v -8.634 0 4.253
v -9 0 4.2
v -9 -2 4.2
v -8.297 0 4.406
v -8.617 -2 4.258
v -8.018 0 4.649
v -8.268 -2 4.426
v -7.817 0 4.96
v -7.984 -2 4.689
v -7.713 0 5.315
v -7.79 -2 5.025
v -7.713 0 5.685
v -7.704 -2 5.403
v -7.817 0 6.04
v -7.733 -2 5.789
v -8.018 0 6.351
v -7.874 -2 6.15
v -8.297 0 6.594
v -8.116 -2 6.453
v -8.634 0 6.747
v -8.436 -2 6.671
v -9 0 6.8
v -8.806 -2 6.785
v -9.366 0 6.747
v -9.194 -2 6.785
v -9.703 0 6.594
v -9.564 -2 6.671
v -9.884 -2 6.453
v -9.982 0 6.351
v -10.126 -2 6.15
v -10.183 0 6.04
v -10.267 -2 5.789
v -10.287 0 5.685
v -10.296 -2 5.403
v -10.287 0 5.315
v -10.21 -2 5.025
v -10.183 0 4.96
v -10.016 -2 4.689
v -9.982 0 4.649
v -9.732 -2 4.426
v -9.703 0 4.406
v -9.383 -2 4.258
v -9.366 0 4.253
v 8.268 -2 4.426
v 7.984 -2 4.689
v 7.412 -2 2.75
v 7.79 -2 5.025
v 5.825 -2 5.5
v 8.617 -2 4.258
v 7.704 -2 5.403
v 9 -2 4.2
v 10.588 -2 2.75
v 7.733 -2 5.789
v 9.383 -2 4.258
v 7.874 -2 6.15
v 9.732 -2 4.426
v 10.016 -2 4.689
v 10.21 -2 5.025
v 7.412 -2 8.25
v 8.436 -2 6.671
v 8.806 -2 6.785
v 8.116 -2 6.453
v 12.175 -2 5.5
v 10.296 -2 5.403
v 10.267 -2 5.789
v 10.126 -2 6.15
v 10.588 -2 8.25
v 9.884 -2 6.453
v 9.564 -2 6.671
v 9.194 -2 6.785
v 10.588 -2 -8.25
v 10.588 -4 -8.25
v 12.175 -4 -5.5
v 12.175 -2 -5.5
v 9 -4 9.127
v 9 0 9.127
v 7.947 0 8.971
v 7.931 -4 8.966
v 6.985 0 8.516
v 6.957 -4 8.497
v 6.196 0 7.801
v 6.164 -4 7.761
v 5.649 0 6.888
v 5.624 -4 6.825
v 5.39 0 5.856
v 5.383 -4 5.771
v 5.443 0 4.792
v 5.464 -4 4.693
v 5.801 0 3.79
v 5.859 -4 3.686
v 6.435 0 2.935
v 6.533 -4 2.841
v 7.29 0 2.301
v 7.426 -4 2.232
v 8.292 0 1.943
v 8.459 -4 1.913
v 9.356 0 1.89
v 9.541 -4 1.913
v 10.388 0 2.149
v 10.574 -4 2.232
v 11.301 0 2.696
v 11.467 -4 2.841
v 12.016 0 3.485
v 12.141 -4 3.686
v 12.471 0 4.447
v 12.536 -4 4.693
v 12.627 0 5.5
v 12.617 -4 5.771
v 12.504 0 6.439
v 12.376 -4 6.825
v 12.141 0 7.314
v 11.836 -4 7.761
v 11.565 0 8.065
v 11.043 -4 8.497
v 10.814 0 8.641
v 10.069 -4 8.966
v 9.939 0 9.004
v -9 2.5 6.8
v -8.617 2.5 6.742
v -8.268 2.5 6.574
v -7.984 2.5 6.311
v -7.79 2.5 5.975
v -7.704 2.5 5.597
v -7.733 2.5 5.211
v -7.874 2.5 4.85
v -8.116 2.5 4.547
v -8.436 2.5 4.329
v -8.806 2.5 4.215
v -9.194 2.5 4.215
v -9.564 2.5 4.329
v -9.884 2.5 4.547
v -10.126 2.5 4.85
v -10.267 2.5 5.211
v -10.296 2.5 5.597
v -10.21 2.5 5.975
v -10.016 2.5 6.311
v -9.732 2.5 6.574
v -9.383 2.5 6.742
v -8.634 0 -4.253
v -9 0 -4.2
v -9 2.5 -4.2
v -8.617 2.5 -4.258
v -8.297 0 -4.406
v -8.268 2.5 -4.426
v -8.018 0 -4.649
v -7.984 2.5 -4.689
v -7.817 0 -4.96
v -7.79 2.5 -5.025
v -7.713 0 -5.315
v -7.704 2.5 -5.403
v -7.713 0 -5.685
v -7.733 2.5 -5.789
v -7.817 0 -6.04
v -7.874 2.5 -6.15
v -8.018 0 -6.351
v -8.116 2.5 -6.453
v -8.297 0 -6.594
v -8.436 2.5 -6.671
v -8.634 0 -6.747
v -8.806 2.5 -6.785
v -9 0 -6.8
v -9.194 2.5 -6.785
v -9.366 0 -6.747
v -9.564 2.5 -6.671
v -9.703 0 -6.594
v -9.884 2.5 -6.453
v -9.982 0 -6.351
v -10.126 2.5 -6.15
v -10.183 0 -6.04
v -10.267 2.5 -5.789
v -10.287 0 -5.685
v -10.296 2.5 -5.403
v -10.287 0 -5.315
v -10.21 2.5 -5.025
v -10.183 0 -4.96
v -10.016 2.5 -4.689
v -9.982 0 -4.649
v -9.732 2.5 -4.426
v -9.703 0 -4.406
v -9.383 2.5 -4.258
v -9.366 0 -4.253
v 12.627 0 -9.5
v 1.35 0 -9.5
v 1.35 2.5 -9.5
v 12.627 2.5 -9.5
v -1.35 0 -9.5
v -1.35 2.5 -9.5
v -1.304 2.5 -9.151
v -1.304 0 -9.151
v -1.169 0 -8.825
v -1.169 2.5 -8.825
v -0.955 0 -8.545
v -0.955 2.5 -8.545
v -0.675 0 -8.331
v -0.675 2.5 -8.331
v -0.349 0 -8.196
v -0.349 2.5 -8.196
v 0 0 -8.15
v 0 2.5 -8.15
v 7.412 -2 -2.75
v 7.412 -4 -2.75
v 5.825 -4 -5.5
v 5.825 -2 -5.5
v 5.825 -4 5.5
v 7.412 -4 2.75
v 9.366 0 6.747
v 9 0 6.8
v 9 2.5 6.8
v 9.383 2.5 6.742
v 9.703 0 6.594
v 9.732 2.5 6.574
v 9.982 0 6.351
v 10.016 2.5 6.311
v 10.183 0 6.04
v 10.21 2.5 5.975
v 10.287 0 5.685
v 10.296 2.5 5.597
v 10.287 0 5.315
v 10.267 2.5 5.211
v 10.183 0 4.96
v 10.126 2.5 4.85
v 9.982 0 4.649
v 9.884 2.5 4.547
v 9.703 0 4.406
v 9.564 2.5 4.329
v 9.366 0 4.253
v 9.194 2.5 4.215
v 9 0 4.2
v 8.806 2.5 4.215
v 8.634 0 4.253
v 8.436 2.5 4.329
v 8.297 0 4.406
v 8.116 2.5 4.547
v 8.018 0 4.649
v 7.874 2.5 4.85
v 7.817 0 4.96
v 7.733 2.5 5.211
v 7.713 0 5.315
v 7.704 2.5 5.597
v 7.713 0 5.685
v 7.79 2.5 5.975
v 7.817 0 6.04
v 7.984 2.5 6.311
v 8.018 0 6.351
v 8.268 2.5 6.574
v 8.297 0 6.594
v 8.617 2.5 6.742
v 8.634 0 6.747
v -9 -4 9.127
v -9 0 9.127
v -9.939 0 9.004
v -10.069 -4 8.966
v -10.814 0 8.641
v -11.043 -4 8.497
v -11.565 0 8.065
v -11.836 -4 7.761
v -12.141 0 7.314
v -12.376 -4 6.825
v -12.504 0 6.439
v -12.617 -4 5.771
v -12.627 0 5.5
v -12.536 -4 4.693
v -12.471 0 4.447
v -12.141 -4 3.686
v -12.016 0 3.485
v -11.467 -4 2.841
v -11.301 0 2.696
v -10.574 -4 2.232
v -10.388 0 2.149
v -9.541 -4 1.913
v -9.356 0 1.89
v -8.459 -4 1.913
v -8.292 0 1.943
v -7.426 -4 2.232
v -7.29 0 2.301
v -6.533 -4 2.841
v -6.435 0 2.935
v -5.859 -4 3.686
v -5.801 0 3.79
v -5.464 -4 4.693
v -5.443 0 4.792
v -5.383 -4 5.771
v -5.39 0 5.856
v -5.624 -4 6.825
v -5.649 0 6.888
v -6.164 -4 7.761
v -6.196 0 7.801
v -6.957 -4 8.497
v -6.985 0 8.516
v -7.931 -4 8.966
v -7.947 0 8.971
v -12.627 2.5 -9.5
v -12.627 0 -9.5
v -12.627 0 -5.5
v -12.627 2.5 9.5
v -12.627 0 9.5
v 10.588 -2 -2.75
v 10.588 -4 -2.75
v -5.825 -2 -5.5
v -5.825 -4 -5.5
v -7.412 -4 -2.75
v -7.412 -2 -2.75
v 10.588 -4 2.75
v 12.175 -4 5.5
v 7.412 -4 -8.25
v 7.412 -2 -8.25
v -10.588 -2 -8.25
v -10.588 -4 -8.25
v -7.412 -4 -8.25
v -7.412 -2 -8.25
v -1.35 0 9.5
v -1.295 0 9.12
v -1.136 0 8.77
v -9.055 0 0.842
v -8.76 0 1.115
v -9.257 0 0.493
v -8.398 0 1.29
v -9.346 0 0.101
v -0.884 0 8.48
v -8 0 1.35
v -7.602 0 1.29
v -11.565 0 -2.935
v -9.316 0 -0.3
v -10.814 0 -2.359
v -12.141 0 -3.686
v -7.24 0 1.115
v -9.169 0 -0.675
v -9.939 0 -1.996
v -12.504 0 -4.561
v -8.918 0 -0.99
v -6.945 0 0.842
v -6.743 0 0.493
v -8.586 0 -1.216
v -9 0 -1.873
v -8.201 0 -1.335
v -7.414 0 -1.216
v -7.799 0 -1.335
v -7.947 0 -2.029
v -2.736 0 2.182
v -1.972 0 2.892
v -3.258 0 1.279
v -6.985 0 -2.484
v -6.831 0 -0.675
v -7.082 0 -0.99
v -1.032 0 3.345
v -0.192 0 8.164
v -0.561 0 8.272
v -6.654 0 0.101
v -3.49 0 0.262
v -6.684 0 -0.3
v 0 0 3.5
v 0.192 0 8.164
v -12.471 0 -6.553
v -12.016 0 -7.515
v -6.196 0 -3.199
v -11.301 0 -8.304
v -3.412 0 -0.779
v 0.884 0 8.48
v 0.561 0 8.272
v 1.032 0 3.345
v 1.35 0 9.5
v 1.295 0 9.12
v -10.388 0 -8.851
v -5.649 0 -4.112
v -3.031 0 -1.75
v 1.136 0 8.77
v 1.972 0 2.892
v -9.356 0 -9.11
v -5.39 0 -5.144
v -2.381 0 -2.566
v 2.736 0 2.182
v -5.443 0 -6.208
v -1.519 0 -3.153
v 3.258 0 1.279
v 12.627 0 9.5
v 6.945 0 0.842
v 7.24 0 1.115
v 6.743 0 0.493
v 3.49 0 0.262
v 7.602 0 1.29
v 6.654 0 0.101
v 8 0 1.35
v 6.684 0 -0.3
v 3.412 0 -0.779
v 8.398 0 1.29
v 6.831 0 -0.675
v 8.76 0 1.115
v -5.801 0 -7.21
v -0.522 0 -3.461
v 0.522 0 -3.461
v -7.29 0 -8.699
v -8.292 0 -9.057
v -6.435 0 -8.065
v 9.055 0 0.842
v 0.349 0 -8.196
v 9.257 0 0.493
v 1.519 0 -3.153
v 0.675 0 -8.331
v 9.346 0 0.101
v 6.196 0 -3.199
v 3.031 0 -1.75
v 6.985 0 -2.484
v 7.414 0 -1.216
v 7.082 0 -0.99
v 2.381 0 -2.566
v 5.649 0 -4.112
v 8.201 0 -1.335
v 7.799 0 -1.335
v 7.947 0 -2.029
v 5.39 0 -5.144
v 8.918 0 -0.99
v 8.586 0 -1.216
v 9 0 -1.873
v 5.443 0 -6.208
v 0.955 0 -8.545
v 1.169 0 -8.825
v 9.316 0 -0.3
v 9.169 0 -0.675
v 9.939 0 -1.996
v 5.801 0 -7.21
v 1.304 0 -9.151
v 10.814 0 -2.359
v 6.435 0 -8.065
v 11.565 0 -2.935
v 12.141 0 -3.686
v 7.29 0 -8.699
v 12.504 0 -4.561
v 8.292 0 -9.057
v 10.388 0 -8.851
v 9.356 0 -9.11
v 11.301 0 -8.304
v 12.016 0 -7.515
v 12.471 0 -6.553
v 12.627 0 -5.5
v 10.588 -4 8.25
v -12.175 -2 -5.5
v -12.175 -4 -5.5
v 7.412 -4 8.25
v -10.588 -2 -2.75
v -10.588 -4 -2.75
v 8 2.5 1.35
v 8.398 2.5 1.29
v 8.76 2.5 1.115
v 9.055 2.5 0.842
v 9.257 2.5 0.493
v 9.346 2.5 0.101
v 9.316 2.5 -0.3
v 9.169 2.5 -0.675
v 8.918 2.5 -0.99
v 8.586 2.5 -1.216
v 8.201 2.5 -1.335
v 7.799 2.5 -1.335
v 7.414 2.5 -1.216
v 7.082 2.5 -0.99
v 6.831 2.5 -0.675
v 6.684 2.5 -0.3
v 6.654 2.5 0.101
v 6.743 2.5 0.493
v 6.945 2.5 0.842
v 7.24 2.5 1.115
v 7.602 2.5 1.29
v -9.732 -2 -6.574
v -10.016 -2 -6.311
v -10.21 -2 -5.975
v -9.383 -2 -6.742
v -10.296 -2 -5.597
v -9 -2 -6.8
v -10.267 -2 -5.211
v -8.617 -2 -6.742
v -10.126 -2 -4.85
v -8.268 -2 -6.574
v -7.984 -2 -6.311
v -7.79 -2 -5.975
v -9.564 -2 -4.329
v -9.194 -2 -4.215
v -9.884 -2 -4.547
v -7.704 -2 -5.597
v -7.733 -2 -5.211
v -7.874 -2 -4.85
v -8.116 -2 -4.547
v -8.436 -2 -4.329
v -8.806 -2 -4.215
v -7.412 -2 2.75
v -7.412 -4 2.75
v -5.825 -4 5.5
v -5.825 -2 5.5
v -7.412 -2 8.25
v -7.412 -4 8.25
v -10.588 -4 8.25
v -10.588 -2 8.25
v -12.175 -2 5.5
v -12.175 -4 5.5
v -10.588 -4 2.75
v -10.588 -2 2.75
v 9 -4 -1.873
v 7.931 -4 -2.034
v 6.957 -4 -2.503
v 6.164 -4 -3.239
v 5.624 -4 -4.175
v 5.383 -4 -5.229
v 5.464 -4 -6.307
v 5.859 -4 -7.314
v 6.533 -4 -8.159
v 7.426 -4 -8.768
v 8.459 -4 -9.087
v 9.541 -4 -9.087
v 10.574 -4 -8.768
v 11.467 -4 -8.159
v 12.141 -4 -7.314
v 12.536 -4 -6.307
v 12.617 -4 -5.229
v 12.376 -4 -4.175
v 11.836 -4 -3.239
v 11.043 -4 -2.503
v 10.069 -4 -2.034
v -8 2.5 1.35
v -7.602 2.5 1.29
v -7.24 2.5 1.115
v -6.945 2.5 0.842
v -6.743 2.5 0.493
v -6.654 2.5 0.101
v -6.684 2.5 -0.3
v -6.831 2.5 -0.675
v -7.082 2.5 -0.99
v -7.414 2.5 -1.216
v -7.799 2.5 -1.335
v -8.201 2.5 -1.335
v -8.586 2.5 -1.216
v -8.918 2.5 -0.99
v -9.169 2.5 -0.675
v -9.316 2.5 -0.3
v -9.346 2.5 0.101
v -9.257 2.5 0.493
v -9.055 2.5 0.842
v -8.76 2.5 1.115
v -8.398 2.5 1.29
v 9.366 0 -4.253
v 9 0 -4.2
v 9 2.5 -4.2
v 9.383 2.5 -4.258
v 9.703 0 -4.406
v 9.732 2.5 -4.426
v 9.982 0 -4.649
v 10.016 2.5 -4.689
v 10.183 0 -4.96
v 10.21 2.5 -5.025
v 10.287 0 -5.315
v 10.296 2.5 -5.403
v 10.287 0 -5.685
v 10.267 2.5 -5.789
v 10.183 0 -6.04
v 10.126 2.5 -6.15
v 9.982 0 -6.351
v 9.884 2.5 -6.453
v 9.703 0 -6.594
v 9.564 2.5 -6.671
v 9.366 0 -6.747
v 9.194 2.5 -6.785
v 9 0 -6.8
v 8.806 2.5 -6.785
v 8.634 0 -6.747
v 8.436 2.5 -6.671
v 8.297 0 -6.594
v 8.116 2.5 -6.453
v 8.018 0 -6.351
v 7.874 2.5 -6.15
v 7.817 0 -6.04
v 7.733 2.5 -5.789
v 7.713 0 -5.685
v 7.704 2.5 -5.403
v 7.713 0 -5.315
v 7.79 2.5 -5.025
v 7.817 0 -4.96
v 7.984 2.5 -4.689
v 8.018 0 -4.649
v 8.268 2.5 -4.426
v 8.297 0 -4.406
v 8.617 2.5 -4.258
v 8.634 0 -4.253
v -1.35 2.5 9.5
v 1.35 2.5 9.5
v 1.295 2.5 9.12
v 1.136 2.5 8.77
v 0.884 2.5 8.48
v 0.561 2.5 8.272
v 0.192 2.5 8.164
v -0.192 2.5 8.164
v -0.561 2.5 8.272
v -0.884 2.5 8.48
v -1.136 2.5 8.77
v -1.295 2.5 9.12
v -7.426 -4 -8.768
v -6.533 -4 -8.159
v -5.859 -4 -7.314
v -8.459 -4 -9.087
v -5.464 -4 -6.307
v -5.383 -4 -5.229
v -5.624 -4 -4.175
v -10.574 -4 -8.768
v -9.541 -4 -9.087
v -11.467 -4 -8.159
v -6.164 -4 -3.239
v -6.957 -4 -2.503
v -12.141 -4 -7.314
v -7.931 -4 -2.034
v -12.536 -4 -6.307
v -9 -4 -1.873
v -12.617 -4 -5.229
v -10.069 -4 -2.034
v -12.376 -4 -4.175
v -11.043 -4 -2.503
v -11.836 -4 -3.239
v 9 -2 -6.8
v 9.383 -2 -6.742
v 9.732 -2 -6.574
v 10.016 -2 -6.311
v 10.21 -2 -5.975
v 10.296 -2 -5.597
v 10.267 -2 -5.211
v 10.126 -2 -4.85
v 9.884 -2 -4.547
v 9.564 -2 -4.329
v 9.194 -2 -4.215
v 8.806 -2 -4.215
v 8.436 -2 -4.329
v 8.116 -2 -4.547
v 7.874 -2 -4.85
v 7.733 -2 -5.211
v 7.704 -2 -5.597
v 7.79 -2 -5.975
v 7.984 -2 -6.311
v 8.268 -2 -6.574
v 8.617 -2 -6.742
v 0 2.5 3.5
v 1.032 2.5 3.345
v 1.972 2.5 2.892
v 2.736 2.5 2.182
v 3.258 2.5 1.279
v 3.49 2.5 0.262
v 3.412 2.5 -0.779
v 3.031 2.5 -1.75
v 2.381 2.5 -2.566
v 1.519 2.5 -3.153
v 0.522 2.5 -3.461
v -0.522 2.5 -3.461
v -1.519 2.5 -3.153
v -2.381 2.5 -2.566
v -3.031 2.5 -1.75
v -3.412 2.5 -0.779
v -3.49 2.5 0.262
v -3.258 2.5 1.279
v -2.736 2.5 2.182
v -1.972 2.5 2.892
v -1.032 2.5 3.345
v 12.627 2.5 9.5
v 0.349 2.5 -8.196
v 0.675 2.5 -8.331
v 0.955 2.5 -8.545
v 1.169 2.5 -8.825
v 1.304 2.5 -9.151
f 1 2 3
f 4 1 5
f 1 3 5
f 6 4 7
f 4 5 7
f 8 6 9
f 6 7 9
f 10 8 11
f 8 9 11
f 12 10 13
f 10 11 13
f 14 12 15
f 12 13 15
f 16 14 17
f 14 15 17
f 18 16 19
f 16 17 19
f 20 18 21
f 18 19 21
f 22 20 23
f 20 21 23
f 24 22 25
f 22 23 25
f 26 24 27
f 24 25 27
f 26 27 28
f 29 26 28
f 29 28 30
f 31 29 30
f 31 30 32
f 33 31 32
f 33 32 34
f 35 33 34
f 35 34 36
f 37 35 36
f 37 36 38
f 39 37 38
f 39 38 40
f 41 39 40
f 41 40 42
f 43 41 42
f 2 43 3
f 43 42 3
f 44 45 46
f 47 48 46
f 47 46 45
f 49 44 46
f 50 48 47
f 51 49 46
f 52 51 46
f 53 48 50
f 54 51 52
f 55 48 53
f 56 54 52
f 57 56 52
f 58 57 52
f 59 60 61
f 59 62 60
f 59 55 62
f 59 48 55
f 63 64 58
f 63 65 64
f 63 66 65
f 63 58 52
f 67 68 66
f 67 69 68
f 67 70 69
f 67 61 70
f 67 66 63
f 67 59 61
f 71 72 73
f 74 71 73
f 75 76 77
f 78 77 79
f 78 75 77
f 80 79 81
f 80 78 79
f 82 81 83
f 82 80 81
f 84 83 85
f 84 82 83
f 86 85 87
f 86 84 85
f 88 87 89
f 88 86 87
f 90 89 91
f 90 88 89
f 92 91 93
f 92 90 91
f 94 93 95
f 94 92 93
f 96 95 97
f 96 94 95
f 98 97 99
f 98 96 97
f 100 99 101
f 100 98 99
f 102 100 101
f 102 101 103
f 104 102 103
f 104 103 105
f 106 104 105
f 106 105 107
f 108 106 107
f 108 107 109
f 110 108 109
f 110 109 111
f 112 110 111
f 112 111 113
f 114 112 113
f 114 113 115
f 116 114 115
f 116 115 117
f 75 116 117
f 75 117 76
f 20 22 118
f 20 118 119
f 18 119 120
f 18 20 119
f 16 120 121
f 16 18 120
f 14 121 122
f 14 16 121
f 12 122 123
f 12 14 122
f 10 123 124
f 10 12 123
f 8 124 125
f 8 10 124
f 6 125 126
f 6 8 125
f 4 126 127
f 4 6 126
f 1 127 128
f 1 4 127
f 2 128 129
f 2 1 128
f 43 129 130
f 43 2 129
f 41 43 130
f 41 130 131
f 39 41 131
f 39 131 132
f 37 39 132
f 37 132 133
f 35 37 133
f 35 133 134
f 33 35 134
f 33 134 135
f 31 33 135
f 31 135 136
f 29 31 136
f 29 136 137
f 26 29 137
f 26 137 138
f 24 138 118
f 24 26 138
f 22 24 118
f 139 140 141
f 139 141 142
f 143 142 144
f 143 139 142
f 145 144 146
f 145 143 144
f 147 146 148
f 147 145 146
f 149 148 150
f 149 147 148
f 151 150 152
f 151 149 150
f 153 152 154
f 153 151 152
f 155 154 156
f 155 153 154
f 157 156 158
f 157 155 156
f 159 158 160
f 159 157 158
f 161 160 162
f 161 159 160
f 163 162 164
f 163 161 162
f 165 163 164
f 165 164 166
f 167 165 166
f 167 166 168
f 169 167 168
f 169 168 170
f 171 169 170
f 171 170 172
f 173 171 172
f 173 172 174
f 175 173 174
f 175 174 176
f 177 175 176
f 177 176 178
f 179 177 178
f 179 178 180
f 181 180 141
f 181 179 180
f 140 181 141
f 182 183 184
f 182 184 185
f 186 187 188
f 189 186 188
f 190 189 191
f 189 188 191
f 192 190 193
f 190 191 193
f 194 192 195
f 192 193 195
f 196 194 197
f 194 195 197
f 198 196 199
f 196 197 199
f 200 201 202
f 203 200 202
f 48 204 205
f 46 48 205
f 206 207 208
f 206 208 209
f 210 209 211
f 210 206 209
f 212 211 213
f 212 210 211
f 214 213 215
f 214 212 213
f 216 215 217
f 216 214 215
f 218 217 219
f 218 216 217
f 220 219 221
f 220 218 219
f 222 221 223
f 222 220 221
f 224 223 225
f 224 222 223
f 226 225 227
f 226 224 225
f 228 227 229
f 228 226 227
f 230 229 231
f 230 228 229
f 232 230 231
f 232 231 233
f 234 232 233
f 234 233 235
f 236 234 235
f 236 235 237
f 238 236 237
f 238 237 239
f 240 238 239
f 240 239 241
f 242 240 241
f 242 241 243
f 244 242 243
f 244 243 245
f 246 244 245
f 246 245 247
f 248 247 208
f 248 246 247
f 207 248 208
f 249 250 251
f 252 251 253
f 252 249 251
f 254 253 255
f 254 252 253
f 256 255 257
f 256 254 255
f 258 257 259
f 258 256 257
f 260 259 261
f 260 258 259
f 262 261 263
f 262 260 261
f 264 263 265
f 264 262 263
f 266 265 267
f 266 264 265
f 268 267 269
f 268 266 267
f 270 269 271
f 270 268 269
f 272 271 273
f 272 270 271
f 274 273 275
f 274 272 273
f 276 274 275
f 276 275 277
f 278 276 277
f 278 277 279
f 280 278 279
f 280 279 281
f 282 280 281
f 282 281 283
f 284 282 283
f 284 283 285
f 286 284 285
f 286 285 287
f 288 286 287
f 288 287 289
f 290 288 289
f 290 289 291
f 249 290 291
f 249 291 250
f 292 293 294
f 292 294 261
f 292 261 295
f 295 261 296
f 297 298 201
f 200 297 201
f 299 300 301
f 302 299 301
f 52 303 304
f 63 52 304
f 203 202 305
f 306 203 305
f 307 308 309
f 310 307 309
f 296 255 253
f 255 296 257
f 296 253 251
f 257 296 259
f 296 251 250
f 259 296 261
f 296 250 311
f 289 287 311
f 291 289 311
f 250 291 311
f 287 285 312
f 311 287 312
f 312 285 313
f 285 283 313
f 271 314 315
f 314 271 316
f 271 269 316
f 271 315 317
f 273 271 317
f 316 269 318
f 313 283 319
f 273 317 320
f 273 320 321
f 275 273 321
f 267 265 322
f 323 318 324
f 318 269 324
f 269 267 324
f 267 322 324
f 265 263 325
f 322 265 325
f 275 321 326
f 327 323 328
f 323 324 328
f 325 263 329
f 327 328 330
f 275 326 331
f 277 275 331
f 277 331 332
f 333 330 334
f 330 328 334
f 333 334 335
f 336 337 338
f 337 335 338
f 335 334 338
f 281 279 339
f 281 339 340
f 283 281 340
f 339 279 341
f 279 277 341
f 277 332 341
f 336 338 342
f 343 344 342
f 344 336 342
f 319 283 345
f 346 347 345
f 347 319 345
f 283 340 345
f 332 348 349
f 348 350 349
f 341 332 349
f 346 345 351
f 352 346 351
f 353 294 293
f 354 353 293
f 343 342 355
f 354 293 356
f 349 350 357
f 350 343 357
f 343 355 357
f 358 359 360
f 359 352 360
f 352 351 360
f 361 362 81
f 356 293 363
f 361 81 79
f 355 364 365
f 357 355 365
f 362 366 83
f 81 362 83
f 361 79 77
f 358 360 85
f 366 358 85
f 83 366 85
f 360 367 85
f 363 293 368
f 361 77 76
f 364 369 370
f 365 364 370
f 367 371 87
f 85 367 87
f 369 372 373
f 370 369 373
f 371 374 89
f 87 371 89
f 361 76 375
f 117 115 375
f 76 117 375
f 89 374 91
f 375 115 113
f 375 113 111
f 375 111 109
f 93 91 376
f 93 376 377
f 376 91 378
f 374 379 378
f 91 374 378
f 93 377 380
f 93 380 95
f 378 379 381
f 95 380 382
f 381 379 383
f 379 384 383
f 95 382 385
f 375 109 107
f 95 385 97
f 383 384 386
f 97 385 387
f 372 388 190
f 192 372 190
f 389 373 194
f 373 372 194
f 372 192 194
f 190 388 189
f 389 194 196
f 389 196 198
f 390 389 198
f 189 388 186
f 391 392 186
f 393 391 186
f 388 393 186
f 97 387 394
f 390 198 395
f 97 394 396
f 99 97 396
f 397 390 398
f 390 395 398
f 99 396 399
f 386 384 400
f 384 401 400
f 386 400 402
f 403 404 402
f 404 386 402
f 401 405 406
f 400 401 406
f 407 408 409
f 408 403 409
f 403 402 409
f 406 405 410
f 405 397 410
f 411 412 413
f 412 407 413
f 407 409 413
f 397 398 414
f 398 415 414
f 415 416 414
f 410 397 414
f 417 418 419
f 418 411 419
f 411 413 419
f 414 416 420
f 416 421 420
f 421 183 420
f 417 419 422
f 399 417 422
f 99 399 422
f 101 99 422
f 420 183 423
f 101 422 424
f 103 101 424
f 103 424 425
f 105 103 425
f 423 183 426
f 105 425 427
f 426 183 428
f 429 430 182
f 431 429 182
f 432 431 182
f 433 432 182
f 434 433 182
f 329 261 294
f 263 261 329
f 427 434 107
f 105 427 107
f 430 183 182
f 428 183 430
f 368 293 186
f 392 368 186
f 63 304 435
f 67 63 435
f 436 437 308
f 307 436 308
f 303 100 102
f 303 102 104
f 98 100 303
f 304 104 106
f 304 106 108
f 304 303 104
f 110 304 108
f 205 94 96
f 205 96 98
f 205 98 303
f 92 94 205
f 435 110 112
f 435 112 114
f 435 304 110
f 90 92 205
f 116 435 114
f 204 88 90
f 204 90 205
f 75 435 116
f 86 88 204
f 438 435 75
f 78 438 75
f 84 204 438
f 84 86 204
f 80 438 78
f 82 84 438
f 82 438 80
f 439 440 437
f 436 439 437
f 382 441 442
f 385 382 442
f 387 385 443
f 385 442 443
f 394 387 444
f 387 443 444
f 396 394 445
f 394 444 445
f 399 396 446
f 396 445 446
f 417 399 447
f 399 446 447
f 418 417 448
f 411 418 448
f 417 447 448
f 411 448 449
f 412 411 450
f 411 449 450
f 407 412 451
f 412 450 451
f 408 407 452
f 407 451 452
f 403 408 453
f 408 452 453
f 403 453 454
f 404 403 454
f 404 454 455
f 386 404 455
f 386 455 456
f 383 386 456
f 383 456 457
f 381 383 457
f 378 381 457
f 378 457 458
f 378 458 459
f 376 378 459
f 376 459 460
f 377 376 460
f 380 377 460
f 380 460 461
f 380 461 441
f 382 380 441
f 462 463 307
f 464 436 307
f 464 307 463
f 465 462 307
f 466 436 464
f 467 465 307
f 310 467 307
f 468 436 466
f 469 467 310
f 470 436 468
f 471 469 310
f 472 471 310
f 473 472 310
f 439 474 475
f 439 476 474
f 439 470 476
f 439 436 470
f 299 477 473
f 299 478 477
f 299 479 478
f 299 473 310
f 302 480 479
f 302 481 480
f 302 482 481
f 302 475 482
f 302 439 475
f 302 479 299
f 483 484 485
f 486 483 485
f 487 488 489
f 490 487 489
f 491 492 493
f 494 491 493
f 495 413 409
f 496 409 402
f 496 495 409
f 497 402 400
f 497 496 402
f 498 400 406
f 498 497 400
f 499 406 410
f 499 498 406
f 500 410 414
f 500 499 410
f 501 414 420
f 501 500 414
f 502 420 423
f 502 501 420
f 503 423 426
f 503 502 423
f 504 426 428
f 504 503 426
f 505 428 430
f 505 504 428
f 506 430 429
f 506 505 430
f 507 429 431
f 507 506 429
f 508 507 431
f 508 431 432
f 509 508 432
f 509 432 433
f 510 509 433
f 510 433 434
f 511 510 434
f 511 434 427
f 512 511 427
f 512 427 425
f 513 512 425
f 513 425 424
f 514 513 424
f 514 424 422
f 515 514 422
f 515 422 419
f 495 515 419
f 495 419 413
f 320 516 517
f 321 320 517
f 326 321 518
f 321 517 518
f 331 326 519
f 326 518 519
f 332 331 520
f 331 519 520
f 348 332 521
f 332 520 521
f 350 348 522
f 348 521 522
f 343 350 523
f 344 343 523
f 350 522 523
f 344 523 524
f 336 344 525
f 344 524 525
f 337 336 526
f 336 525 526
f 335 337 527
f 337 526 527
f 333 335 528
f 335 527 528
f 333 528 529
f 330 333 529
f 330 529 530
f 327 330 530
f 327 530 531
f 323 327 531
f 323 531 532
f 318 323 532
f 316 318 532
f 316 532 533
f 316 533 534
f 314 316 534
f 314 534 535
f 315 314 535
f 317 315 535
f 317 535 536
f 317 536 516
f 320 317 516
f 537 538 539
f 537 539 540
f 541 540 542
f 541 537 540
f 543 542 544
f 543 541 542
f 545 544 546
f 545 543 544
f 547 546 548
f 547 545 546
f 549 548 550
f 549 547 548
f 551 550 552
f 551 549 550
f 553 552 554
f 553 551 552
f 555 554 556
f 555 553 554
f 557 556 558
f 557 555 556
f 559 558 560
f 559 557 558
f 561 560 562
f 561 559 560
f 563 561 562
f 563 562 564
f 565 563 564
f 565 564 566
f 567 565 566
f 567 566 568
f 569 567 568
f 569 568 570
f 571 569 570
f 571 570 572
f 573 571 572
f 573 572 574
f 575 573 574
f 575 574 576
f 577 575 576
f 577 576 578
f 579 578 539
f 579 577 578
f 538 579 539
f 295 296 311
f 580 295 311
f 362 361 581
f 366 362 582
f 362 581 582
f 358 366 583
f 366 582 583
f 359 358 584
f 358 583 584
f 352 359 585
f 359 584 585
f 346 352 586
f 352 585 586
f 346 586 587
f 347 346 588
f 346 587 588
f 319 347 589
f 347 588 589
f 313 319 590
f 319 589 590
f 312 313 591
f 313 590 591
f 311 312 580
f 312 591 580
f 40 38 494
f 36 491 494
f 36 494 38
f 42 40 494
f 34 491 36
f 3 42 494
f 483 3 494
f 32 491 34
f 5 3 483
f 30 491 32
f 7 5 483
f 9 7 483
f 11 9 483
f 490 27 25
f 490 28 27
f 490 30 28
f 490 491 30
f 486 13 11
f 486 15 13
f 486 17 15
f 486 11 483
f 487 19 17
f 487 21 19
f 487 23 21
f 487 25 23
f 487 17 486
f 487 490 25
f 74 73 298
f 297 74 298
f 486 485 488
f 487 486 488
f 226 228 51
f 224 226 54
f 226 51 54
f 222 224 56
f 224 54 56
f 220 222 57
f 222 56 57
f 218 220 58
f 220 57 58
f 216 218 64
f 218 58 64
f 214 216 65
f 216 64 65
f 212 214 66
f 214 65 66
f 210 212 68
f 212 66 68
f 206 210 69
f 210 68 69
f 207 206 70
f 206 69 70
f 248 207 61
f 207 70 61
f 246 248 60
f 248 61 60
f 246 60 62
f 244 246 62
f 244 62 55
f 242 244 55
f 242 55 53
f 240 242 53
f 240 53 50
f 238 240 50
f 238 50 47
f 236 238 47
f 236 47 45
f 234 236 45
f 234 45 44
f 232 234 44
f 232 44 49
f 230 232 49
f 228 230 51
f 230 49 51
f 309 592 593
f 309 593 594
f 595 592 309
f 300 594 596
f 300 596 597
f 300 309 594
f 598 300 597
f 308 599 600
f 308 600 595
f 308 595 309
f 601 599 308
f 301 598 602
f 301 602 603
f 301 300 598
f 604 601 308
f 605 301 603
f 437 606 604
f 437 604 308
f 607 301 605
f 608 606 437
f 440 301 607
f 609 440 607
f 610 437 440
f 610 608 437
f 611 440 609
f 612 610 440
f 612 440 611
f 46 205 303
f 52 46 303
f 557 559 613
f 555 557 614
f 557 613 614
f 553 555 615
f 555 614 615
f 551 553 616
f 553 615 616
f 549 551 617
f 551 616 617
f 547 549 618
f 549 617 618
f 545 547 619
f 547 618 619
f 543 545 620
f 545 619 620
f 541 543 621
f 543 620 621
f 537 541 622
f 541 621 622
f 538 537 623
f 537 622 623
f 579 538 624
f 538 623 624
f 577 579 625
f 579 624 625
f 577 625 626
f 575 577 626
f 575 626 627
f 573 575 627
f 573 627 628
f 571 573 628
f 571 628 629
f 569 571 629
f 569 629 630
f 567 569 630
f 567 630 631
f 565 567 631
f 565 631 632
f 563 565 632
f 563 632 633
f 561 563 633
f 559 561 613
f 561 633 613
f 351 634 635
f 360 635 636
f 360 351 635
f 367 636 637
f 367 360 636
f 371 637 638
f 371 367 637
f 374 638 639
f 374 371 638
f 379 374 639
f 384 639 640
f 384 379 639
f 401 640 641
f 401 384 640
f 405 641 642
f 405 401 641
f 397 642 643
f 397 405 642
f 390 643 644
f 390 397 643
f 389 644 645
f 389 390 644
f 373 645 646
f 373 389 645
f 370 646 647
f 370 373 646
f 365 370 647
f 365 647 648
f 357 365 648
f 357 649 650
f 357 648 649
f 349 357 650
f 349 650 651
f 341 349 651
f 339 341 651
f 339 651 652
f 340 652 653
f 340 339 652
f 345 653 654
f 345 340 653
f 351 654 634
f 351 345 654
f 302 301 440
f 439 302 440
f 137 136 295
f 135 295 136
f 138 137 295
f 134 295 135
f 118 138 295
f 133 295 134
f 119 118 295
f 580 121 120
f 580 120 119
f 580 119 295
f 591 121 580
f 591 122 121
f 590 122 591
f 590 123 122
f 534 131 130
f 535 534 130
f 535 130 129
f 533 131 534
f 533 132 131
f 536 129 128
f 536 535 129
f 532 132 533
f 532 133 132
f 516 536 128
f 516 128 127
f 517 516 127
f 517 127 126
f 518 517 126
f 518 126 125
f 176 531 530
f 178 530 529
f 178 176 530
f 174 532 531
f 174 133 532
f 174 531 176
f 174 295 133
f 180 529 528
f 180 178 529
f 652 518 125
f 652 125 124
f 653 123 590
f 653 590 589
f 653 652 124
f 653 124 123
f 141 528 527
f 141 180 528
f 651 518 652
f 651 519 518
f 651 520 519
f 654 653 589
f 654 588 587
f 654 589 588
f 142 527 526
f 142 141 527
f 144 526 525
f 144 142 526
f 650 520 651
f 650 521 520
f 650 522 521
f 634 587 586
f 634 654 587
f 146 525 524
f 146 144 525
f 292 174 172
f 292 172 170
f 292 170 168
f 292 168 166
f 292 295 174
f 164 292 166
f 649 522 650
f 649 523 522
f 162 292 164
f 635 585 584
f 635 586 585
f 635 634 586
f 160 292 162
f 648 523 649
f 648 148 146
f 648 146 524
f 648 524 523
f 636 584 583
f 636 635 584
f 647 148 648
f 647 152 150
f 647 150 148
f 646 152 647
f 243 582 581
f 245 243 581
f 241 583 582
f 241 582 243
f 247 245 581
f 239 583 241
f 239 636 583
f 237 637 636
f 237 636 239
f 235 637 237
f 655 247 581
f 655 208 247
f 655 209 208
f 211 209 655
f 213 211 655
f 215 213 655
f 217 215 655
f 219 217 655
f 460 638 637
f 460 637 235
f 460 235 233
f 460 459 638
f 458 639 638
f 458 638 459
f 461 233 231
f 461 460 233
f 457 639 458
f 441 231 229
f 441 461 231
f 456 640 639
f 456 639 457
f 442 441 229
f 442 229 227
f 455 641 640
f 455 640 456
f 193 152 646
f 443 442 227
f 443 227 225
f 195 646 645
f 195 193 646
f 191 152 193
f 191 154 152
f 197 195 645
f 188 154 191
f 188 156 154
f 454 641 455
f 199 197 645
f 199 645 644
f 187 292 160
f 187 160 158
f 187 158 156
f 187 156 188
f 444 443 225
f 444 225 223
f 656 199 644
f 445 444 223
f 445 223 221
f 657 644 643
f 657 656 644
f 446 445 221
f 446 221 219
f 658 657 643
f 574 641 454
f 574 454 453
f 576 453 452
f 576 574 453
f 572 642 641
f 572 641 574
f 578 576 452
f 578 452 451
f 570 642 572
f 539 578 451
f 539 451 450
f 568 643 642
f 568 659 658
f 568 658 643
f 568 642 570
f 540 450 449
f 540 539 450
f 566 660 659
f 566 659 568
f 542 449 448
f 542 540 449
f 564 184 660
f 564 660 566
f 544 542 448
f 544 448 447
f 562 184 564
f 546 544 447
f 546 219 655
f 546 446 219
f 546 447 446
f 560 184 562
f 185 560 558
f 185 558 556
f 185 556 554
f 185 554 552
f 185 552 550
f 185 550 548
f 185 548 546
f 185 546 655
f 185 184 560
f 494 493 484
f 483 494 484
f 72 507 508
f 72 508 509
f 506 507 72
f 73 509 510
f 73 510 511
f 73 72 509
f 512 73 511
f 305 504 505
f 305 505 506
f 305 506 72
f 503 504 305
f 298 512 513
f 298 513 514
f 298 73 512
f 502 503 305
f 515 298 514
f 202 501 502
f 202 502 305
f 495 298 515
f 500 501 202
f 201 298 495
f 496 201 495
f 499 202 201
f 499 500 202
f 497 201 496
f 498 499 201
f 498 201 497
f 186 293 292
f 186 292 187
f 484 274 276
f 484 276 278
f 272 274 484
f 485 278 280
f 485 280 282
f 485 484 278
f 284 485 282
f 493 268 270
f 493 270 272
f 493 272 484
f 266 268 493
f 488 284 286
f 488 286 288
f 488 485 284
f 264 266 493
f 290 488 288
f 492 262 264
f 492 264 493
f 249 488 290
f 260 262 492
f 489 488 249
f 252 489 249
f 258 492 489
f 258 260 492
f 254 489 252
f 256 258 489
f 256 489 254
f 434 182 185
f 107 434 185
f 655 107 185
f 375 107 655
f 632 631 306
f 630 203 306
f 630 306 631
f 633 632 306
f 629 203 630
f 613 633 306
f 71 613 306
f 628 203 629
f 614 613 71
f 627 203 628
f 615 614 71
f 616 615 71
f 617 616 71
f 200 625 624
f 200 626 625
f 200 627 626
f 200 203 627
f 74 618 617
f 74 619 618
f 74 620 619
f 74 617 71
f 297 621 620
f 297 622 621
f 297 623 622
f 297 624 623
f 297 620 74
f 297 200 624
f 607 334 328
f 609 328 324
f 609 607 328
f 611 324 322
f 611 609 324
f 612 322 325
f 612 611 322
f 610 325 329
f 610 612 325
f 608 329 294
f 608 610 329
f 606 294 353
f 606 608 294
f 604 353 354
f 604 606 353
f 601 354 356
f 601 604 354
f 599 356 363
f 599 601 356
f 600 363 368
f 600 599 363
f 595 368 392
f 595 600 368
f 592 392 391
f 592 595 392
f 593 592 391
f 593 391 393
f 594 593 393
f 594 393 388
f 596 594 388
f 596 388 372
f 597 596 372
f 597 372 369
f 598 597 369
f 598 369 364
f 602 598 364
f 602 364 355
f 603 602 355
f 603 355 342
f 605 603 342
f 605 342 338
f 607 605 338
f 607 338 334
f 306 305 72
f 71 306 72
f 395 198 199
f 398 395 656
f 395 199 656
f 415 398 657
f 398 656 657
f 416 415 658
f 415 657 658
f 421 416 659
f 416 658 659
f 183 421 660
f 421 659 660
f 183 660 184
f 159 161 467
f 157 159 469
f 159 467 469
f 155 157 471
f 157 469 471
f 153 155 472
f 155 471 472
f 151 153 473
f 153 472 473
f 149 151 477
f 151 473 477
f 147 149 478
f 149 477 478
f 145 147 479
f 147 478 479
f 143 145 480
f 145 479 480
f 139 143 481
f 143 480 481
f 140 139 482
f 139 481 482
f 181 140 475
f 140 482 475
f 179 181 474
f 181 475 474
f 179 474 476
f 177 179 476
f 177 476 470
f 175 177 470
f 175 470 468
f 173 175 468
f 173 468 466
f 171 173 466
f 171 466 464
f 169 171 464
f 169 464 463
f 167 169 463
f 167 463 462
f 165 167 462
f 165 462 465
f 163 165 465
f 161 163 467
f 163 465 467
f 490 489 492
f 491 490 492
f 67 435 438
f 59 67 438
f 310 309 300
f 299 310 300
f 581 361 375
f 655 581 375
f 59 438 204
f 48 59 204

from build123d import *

# Parameters (mm, degrees)
SKETCH1_W             = 29.006558678
SKETCH1_H             = 29.831389996
BOARDMOUNTHOLES_DEPTH = 2.5
SKETCH1_3_R           = 1.3
BOARDMOUNTS_DEPTH     = 21.954070461
BOARDSTANDOFFS_START  = 4
SKETCH3_R             = 3.627144727
SKETCH3_R_2           = 1.3
BOARDSTANDOFFS_DEPTH  = 4
NUTCUTOUT_DEPTH       = 2
SKETCH1_4_R           = 3.5
MAGNETHOLE_DEPTH      = 22.185444741
SKETCH2_R             = 1.35
MOTORMOUNTHOLES_DEPTH = 22.796170968
SKETCH5_OUTSIDE_W     = 39.428
SKETCH5_OUTSIDE_H     = 40.254
SKETCH5_OUTSIDE_W_2   = 25.254289454
SKETCH5_OUTSIDE_H_2   = 19
CUT_EXTRUDE4_DEPTH    = 22.185444741


with BuildPart() as part:
    # Sketch1 → BoardMountHoles (new body)
    with BuildSketch(Plane(origin=(0, 0, 0), x_dir=(1, 0, 0), z_dir=(0, 1, 0))):
        Rectangle(SKETCH1_W, SKETCH1_H)
    extrude(amount=BOARDMOUNTHOLES_DEPTH)

    # Sketch1<3> → BoardMounts (cut, through all)
    with BuildSketch(Plane(origin=(0, 0, 0), x_dir=(1, 0, 0), z_dir=(0, 1, 0))):
        with Locations((9, 5.5)):
            Circle(SKETCH1_3_R)
        with Locations((9, -5.5)):
            Circle(SKETCH1_3_R)
        with Locations((-9, -5.5)):
            Circle(SKETCH1_3_R)
        with Locations((-9, 5.5)):
            Circle(SKETCH1_3_R)
    extrude(amount=BOARDMOUNTS_DEPTH, mode=Mode.SUBTRACT)

    # Sketch3 → BoardStandoffs (add)
    # profile 1 of 4: a face of its own
    with BuildSketch(Plane.XZ.offset(BOARDSTANDOFFS_START)):
        with Locations((9, 5.5)):
            Circle(SKETCH3_R)
        with Locations((9, 5.5)):
            Circle(SKETCH3_R_2, mode=Mode.SUBTRACT)
    # profile 2 of 4: a face of its own
    with BuildSketch(Plane.XZ.offset(BOARDSTANDOFFS_START)):
        with Locations((9, -5.5)):
            Circle(SKETCH3_R)
        with Locations((9, -5.5)):
            Circle(SKETCH3_R_2, mode=Mode.SUBTRACT)
    # profile 3 of 4: a face of its own
    with BuildSketch(Plane.XZ.offset(BOARDSTANDOFFS_START)):
        with Locations((-9, -5.5)):
            Circle(SKETCH3_R)
        with Locations((-9, -5.5)):
            Circle(SKETCH3_R_2, mode=Mode.SUBTRACT)
    # profile 4 of 4: a face of its own
    with BuildSketch(Plane.XZ.offset(BOARDSTANDOFFS_START)):
        with Locations((-9, 5.5)):
            Circle(SKETCH3_R)
        with Locations((-9, 5.5)):
            Circle(SKETCH3_R_2, mode=Mode.SUBTRACT)
    extrude(amount=-BOARDSTANDOFFS_DEPTH)

    # Sketch4 → NutCutout (cut)
    with BuildSketch(Plane.XZ.offset(4)):
        Polygon((12.175426481, -5.5), (10.58771324, -2.75), (7.41228676, -2.75), (5.824573519, -5.5), (7.41228676, -8.25), (10.58771324, -8.25), align=None)
        Polygon((-5.824573519, -5.5), (-7.41228676, -2.75), (-10.58771324, -2.75), (-12.175426481, -5.5), (-10.58771324, -8.25), (-7.41228676, -8.25), align=None)
        Polygon((-5.824573519, 5.5), (-7.41228676, 8.25), (-10.58771324, 8.25), (-12.175426481, 5.5), (-10.58771324, 2.75), (-7.41228676, 2.75), align=None)
        Polygon((12.175426481, 5.5), (10.58771324, 8.25), (7.41228676, 8.25), (5.824573519, 5.5), (7.41228676, 2.75), (10.58771324, 2.75), align=None)
    extrude(amount=-NUTCUTOUT_DEPTH, mode=Mode.SUBTRACT)

    # Sketch1<4> → MagnetHole (cut, through all)
    with BuildSketch(Plane(origin=(0, 0, 0), x_dir=(1, 0, 0), z_dir=(0, 1, 0))):
        Circle(SKETCH1_4_R)
    extrude(amount=MAGNETHOLE_DEPTH, mode=Mode.SUBTRACT)

    # Sketch2 → MotorMountHoles (cut, through all)
    with BuildSketch(Plane(origin=(0, 2.5, 0), x_dir=(1, 0, 0), z_dir=(0, 1, 0))):
        with Locations((8, 0)):
            Circle(SKETCH2_R)
        with Locations((0, 9.5)):
            Circle(SKETCH2_R)
        with Locations((-8, 0)):
            Circle(SKETCH2_R)
        with Locations((0, -9.5)):
            Circle(SKETCH2_R)
    extrude(amount=-MOTORMOUNTHOLES_DEPTH, mode=Mode.SUBTRACT)

    # Sketch5 outside → Cut-Extrude4 (cut, through all)
    with BuildSketch(Plane.XZ):
        Rectangle(SKETCH5_OUTSIDE_W, SKETCH5_OUTSIDE_H)
        Rectangle(SKETCH5_OUTSIDE_W_2, SKETCH5_OUTSIDE_H_2, mode=Mode.SUBTRACT)
    extrude(amount=-CUT_EXTRUDE4_DEPTH, mode=Mode.SUBTRACT)


solid = part.part
